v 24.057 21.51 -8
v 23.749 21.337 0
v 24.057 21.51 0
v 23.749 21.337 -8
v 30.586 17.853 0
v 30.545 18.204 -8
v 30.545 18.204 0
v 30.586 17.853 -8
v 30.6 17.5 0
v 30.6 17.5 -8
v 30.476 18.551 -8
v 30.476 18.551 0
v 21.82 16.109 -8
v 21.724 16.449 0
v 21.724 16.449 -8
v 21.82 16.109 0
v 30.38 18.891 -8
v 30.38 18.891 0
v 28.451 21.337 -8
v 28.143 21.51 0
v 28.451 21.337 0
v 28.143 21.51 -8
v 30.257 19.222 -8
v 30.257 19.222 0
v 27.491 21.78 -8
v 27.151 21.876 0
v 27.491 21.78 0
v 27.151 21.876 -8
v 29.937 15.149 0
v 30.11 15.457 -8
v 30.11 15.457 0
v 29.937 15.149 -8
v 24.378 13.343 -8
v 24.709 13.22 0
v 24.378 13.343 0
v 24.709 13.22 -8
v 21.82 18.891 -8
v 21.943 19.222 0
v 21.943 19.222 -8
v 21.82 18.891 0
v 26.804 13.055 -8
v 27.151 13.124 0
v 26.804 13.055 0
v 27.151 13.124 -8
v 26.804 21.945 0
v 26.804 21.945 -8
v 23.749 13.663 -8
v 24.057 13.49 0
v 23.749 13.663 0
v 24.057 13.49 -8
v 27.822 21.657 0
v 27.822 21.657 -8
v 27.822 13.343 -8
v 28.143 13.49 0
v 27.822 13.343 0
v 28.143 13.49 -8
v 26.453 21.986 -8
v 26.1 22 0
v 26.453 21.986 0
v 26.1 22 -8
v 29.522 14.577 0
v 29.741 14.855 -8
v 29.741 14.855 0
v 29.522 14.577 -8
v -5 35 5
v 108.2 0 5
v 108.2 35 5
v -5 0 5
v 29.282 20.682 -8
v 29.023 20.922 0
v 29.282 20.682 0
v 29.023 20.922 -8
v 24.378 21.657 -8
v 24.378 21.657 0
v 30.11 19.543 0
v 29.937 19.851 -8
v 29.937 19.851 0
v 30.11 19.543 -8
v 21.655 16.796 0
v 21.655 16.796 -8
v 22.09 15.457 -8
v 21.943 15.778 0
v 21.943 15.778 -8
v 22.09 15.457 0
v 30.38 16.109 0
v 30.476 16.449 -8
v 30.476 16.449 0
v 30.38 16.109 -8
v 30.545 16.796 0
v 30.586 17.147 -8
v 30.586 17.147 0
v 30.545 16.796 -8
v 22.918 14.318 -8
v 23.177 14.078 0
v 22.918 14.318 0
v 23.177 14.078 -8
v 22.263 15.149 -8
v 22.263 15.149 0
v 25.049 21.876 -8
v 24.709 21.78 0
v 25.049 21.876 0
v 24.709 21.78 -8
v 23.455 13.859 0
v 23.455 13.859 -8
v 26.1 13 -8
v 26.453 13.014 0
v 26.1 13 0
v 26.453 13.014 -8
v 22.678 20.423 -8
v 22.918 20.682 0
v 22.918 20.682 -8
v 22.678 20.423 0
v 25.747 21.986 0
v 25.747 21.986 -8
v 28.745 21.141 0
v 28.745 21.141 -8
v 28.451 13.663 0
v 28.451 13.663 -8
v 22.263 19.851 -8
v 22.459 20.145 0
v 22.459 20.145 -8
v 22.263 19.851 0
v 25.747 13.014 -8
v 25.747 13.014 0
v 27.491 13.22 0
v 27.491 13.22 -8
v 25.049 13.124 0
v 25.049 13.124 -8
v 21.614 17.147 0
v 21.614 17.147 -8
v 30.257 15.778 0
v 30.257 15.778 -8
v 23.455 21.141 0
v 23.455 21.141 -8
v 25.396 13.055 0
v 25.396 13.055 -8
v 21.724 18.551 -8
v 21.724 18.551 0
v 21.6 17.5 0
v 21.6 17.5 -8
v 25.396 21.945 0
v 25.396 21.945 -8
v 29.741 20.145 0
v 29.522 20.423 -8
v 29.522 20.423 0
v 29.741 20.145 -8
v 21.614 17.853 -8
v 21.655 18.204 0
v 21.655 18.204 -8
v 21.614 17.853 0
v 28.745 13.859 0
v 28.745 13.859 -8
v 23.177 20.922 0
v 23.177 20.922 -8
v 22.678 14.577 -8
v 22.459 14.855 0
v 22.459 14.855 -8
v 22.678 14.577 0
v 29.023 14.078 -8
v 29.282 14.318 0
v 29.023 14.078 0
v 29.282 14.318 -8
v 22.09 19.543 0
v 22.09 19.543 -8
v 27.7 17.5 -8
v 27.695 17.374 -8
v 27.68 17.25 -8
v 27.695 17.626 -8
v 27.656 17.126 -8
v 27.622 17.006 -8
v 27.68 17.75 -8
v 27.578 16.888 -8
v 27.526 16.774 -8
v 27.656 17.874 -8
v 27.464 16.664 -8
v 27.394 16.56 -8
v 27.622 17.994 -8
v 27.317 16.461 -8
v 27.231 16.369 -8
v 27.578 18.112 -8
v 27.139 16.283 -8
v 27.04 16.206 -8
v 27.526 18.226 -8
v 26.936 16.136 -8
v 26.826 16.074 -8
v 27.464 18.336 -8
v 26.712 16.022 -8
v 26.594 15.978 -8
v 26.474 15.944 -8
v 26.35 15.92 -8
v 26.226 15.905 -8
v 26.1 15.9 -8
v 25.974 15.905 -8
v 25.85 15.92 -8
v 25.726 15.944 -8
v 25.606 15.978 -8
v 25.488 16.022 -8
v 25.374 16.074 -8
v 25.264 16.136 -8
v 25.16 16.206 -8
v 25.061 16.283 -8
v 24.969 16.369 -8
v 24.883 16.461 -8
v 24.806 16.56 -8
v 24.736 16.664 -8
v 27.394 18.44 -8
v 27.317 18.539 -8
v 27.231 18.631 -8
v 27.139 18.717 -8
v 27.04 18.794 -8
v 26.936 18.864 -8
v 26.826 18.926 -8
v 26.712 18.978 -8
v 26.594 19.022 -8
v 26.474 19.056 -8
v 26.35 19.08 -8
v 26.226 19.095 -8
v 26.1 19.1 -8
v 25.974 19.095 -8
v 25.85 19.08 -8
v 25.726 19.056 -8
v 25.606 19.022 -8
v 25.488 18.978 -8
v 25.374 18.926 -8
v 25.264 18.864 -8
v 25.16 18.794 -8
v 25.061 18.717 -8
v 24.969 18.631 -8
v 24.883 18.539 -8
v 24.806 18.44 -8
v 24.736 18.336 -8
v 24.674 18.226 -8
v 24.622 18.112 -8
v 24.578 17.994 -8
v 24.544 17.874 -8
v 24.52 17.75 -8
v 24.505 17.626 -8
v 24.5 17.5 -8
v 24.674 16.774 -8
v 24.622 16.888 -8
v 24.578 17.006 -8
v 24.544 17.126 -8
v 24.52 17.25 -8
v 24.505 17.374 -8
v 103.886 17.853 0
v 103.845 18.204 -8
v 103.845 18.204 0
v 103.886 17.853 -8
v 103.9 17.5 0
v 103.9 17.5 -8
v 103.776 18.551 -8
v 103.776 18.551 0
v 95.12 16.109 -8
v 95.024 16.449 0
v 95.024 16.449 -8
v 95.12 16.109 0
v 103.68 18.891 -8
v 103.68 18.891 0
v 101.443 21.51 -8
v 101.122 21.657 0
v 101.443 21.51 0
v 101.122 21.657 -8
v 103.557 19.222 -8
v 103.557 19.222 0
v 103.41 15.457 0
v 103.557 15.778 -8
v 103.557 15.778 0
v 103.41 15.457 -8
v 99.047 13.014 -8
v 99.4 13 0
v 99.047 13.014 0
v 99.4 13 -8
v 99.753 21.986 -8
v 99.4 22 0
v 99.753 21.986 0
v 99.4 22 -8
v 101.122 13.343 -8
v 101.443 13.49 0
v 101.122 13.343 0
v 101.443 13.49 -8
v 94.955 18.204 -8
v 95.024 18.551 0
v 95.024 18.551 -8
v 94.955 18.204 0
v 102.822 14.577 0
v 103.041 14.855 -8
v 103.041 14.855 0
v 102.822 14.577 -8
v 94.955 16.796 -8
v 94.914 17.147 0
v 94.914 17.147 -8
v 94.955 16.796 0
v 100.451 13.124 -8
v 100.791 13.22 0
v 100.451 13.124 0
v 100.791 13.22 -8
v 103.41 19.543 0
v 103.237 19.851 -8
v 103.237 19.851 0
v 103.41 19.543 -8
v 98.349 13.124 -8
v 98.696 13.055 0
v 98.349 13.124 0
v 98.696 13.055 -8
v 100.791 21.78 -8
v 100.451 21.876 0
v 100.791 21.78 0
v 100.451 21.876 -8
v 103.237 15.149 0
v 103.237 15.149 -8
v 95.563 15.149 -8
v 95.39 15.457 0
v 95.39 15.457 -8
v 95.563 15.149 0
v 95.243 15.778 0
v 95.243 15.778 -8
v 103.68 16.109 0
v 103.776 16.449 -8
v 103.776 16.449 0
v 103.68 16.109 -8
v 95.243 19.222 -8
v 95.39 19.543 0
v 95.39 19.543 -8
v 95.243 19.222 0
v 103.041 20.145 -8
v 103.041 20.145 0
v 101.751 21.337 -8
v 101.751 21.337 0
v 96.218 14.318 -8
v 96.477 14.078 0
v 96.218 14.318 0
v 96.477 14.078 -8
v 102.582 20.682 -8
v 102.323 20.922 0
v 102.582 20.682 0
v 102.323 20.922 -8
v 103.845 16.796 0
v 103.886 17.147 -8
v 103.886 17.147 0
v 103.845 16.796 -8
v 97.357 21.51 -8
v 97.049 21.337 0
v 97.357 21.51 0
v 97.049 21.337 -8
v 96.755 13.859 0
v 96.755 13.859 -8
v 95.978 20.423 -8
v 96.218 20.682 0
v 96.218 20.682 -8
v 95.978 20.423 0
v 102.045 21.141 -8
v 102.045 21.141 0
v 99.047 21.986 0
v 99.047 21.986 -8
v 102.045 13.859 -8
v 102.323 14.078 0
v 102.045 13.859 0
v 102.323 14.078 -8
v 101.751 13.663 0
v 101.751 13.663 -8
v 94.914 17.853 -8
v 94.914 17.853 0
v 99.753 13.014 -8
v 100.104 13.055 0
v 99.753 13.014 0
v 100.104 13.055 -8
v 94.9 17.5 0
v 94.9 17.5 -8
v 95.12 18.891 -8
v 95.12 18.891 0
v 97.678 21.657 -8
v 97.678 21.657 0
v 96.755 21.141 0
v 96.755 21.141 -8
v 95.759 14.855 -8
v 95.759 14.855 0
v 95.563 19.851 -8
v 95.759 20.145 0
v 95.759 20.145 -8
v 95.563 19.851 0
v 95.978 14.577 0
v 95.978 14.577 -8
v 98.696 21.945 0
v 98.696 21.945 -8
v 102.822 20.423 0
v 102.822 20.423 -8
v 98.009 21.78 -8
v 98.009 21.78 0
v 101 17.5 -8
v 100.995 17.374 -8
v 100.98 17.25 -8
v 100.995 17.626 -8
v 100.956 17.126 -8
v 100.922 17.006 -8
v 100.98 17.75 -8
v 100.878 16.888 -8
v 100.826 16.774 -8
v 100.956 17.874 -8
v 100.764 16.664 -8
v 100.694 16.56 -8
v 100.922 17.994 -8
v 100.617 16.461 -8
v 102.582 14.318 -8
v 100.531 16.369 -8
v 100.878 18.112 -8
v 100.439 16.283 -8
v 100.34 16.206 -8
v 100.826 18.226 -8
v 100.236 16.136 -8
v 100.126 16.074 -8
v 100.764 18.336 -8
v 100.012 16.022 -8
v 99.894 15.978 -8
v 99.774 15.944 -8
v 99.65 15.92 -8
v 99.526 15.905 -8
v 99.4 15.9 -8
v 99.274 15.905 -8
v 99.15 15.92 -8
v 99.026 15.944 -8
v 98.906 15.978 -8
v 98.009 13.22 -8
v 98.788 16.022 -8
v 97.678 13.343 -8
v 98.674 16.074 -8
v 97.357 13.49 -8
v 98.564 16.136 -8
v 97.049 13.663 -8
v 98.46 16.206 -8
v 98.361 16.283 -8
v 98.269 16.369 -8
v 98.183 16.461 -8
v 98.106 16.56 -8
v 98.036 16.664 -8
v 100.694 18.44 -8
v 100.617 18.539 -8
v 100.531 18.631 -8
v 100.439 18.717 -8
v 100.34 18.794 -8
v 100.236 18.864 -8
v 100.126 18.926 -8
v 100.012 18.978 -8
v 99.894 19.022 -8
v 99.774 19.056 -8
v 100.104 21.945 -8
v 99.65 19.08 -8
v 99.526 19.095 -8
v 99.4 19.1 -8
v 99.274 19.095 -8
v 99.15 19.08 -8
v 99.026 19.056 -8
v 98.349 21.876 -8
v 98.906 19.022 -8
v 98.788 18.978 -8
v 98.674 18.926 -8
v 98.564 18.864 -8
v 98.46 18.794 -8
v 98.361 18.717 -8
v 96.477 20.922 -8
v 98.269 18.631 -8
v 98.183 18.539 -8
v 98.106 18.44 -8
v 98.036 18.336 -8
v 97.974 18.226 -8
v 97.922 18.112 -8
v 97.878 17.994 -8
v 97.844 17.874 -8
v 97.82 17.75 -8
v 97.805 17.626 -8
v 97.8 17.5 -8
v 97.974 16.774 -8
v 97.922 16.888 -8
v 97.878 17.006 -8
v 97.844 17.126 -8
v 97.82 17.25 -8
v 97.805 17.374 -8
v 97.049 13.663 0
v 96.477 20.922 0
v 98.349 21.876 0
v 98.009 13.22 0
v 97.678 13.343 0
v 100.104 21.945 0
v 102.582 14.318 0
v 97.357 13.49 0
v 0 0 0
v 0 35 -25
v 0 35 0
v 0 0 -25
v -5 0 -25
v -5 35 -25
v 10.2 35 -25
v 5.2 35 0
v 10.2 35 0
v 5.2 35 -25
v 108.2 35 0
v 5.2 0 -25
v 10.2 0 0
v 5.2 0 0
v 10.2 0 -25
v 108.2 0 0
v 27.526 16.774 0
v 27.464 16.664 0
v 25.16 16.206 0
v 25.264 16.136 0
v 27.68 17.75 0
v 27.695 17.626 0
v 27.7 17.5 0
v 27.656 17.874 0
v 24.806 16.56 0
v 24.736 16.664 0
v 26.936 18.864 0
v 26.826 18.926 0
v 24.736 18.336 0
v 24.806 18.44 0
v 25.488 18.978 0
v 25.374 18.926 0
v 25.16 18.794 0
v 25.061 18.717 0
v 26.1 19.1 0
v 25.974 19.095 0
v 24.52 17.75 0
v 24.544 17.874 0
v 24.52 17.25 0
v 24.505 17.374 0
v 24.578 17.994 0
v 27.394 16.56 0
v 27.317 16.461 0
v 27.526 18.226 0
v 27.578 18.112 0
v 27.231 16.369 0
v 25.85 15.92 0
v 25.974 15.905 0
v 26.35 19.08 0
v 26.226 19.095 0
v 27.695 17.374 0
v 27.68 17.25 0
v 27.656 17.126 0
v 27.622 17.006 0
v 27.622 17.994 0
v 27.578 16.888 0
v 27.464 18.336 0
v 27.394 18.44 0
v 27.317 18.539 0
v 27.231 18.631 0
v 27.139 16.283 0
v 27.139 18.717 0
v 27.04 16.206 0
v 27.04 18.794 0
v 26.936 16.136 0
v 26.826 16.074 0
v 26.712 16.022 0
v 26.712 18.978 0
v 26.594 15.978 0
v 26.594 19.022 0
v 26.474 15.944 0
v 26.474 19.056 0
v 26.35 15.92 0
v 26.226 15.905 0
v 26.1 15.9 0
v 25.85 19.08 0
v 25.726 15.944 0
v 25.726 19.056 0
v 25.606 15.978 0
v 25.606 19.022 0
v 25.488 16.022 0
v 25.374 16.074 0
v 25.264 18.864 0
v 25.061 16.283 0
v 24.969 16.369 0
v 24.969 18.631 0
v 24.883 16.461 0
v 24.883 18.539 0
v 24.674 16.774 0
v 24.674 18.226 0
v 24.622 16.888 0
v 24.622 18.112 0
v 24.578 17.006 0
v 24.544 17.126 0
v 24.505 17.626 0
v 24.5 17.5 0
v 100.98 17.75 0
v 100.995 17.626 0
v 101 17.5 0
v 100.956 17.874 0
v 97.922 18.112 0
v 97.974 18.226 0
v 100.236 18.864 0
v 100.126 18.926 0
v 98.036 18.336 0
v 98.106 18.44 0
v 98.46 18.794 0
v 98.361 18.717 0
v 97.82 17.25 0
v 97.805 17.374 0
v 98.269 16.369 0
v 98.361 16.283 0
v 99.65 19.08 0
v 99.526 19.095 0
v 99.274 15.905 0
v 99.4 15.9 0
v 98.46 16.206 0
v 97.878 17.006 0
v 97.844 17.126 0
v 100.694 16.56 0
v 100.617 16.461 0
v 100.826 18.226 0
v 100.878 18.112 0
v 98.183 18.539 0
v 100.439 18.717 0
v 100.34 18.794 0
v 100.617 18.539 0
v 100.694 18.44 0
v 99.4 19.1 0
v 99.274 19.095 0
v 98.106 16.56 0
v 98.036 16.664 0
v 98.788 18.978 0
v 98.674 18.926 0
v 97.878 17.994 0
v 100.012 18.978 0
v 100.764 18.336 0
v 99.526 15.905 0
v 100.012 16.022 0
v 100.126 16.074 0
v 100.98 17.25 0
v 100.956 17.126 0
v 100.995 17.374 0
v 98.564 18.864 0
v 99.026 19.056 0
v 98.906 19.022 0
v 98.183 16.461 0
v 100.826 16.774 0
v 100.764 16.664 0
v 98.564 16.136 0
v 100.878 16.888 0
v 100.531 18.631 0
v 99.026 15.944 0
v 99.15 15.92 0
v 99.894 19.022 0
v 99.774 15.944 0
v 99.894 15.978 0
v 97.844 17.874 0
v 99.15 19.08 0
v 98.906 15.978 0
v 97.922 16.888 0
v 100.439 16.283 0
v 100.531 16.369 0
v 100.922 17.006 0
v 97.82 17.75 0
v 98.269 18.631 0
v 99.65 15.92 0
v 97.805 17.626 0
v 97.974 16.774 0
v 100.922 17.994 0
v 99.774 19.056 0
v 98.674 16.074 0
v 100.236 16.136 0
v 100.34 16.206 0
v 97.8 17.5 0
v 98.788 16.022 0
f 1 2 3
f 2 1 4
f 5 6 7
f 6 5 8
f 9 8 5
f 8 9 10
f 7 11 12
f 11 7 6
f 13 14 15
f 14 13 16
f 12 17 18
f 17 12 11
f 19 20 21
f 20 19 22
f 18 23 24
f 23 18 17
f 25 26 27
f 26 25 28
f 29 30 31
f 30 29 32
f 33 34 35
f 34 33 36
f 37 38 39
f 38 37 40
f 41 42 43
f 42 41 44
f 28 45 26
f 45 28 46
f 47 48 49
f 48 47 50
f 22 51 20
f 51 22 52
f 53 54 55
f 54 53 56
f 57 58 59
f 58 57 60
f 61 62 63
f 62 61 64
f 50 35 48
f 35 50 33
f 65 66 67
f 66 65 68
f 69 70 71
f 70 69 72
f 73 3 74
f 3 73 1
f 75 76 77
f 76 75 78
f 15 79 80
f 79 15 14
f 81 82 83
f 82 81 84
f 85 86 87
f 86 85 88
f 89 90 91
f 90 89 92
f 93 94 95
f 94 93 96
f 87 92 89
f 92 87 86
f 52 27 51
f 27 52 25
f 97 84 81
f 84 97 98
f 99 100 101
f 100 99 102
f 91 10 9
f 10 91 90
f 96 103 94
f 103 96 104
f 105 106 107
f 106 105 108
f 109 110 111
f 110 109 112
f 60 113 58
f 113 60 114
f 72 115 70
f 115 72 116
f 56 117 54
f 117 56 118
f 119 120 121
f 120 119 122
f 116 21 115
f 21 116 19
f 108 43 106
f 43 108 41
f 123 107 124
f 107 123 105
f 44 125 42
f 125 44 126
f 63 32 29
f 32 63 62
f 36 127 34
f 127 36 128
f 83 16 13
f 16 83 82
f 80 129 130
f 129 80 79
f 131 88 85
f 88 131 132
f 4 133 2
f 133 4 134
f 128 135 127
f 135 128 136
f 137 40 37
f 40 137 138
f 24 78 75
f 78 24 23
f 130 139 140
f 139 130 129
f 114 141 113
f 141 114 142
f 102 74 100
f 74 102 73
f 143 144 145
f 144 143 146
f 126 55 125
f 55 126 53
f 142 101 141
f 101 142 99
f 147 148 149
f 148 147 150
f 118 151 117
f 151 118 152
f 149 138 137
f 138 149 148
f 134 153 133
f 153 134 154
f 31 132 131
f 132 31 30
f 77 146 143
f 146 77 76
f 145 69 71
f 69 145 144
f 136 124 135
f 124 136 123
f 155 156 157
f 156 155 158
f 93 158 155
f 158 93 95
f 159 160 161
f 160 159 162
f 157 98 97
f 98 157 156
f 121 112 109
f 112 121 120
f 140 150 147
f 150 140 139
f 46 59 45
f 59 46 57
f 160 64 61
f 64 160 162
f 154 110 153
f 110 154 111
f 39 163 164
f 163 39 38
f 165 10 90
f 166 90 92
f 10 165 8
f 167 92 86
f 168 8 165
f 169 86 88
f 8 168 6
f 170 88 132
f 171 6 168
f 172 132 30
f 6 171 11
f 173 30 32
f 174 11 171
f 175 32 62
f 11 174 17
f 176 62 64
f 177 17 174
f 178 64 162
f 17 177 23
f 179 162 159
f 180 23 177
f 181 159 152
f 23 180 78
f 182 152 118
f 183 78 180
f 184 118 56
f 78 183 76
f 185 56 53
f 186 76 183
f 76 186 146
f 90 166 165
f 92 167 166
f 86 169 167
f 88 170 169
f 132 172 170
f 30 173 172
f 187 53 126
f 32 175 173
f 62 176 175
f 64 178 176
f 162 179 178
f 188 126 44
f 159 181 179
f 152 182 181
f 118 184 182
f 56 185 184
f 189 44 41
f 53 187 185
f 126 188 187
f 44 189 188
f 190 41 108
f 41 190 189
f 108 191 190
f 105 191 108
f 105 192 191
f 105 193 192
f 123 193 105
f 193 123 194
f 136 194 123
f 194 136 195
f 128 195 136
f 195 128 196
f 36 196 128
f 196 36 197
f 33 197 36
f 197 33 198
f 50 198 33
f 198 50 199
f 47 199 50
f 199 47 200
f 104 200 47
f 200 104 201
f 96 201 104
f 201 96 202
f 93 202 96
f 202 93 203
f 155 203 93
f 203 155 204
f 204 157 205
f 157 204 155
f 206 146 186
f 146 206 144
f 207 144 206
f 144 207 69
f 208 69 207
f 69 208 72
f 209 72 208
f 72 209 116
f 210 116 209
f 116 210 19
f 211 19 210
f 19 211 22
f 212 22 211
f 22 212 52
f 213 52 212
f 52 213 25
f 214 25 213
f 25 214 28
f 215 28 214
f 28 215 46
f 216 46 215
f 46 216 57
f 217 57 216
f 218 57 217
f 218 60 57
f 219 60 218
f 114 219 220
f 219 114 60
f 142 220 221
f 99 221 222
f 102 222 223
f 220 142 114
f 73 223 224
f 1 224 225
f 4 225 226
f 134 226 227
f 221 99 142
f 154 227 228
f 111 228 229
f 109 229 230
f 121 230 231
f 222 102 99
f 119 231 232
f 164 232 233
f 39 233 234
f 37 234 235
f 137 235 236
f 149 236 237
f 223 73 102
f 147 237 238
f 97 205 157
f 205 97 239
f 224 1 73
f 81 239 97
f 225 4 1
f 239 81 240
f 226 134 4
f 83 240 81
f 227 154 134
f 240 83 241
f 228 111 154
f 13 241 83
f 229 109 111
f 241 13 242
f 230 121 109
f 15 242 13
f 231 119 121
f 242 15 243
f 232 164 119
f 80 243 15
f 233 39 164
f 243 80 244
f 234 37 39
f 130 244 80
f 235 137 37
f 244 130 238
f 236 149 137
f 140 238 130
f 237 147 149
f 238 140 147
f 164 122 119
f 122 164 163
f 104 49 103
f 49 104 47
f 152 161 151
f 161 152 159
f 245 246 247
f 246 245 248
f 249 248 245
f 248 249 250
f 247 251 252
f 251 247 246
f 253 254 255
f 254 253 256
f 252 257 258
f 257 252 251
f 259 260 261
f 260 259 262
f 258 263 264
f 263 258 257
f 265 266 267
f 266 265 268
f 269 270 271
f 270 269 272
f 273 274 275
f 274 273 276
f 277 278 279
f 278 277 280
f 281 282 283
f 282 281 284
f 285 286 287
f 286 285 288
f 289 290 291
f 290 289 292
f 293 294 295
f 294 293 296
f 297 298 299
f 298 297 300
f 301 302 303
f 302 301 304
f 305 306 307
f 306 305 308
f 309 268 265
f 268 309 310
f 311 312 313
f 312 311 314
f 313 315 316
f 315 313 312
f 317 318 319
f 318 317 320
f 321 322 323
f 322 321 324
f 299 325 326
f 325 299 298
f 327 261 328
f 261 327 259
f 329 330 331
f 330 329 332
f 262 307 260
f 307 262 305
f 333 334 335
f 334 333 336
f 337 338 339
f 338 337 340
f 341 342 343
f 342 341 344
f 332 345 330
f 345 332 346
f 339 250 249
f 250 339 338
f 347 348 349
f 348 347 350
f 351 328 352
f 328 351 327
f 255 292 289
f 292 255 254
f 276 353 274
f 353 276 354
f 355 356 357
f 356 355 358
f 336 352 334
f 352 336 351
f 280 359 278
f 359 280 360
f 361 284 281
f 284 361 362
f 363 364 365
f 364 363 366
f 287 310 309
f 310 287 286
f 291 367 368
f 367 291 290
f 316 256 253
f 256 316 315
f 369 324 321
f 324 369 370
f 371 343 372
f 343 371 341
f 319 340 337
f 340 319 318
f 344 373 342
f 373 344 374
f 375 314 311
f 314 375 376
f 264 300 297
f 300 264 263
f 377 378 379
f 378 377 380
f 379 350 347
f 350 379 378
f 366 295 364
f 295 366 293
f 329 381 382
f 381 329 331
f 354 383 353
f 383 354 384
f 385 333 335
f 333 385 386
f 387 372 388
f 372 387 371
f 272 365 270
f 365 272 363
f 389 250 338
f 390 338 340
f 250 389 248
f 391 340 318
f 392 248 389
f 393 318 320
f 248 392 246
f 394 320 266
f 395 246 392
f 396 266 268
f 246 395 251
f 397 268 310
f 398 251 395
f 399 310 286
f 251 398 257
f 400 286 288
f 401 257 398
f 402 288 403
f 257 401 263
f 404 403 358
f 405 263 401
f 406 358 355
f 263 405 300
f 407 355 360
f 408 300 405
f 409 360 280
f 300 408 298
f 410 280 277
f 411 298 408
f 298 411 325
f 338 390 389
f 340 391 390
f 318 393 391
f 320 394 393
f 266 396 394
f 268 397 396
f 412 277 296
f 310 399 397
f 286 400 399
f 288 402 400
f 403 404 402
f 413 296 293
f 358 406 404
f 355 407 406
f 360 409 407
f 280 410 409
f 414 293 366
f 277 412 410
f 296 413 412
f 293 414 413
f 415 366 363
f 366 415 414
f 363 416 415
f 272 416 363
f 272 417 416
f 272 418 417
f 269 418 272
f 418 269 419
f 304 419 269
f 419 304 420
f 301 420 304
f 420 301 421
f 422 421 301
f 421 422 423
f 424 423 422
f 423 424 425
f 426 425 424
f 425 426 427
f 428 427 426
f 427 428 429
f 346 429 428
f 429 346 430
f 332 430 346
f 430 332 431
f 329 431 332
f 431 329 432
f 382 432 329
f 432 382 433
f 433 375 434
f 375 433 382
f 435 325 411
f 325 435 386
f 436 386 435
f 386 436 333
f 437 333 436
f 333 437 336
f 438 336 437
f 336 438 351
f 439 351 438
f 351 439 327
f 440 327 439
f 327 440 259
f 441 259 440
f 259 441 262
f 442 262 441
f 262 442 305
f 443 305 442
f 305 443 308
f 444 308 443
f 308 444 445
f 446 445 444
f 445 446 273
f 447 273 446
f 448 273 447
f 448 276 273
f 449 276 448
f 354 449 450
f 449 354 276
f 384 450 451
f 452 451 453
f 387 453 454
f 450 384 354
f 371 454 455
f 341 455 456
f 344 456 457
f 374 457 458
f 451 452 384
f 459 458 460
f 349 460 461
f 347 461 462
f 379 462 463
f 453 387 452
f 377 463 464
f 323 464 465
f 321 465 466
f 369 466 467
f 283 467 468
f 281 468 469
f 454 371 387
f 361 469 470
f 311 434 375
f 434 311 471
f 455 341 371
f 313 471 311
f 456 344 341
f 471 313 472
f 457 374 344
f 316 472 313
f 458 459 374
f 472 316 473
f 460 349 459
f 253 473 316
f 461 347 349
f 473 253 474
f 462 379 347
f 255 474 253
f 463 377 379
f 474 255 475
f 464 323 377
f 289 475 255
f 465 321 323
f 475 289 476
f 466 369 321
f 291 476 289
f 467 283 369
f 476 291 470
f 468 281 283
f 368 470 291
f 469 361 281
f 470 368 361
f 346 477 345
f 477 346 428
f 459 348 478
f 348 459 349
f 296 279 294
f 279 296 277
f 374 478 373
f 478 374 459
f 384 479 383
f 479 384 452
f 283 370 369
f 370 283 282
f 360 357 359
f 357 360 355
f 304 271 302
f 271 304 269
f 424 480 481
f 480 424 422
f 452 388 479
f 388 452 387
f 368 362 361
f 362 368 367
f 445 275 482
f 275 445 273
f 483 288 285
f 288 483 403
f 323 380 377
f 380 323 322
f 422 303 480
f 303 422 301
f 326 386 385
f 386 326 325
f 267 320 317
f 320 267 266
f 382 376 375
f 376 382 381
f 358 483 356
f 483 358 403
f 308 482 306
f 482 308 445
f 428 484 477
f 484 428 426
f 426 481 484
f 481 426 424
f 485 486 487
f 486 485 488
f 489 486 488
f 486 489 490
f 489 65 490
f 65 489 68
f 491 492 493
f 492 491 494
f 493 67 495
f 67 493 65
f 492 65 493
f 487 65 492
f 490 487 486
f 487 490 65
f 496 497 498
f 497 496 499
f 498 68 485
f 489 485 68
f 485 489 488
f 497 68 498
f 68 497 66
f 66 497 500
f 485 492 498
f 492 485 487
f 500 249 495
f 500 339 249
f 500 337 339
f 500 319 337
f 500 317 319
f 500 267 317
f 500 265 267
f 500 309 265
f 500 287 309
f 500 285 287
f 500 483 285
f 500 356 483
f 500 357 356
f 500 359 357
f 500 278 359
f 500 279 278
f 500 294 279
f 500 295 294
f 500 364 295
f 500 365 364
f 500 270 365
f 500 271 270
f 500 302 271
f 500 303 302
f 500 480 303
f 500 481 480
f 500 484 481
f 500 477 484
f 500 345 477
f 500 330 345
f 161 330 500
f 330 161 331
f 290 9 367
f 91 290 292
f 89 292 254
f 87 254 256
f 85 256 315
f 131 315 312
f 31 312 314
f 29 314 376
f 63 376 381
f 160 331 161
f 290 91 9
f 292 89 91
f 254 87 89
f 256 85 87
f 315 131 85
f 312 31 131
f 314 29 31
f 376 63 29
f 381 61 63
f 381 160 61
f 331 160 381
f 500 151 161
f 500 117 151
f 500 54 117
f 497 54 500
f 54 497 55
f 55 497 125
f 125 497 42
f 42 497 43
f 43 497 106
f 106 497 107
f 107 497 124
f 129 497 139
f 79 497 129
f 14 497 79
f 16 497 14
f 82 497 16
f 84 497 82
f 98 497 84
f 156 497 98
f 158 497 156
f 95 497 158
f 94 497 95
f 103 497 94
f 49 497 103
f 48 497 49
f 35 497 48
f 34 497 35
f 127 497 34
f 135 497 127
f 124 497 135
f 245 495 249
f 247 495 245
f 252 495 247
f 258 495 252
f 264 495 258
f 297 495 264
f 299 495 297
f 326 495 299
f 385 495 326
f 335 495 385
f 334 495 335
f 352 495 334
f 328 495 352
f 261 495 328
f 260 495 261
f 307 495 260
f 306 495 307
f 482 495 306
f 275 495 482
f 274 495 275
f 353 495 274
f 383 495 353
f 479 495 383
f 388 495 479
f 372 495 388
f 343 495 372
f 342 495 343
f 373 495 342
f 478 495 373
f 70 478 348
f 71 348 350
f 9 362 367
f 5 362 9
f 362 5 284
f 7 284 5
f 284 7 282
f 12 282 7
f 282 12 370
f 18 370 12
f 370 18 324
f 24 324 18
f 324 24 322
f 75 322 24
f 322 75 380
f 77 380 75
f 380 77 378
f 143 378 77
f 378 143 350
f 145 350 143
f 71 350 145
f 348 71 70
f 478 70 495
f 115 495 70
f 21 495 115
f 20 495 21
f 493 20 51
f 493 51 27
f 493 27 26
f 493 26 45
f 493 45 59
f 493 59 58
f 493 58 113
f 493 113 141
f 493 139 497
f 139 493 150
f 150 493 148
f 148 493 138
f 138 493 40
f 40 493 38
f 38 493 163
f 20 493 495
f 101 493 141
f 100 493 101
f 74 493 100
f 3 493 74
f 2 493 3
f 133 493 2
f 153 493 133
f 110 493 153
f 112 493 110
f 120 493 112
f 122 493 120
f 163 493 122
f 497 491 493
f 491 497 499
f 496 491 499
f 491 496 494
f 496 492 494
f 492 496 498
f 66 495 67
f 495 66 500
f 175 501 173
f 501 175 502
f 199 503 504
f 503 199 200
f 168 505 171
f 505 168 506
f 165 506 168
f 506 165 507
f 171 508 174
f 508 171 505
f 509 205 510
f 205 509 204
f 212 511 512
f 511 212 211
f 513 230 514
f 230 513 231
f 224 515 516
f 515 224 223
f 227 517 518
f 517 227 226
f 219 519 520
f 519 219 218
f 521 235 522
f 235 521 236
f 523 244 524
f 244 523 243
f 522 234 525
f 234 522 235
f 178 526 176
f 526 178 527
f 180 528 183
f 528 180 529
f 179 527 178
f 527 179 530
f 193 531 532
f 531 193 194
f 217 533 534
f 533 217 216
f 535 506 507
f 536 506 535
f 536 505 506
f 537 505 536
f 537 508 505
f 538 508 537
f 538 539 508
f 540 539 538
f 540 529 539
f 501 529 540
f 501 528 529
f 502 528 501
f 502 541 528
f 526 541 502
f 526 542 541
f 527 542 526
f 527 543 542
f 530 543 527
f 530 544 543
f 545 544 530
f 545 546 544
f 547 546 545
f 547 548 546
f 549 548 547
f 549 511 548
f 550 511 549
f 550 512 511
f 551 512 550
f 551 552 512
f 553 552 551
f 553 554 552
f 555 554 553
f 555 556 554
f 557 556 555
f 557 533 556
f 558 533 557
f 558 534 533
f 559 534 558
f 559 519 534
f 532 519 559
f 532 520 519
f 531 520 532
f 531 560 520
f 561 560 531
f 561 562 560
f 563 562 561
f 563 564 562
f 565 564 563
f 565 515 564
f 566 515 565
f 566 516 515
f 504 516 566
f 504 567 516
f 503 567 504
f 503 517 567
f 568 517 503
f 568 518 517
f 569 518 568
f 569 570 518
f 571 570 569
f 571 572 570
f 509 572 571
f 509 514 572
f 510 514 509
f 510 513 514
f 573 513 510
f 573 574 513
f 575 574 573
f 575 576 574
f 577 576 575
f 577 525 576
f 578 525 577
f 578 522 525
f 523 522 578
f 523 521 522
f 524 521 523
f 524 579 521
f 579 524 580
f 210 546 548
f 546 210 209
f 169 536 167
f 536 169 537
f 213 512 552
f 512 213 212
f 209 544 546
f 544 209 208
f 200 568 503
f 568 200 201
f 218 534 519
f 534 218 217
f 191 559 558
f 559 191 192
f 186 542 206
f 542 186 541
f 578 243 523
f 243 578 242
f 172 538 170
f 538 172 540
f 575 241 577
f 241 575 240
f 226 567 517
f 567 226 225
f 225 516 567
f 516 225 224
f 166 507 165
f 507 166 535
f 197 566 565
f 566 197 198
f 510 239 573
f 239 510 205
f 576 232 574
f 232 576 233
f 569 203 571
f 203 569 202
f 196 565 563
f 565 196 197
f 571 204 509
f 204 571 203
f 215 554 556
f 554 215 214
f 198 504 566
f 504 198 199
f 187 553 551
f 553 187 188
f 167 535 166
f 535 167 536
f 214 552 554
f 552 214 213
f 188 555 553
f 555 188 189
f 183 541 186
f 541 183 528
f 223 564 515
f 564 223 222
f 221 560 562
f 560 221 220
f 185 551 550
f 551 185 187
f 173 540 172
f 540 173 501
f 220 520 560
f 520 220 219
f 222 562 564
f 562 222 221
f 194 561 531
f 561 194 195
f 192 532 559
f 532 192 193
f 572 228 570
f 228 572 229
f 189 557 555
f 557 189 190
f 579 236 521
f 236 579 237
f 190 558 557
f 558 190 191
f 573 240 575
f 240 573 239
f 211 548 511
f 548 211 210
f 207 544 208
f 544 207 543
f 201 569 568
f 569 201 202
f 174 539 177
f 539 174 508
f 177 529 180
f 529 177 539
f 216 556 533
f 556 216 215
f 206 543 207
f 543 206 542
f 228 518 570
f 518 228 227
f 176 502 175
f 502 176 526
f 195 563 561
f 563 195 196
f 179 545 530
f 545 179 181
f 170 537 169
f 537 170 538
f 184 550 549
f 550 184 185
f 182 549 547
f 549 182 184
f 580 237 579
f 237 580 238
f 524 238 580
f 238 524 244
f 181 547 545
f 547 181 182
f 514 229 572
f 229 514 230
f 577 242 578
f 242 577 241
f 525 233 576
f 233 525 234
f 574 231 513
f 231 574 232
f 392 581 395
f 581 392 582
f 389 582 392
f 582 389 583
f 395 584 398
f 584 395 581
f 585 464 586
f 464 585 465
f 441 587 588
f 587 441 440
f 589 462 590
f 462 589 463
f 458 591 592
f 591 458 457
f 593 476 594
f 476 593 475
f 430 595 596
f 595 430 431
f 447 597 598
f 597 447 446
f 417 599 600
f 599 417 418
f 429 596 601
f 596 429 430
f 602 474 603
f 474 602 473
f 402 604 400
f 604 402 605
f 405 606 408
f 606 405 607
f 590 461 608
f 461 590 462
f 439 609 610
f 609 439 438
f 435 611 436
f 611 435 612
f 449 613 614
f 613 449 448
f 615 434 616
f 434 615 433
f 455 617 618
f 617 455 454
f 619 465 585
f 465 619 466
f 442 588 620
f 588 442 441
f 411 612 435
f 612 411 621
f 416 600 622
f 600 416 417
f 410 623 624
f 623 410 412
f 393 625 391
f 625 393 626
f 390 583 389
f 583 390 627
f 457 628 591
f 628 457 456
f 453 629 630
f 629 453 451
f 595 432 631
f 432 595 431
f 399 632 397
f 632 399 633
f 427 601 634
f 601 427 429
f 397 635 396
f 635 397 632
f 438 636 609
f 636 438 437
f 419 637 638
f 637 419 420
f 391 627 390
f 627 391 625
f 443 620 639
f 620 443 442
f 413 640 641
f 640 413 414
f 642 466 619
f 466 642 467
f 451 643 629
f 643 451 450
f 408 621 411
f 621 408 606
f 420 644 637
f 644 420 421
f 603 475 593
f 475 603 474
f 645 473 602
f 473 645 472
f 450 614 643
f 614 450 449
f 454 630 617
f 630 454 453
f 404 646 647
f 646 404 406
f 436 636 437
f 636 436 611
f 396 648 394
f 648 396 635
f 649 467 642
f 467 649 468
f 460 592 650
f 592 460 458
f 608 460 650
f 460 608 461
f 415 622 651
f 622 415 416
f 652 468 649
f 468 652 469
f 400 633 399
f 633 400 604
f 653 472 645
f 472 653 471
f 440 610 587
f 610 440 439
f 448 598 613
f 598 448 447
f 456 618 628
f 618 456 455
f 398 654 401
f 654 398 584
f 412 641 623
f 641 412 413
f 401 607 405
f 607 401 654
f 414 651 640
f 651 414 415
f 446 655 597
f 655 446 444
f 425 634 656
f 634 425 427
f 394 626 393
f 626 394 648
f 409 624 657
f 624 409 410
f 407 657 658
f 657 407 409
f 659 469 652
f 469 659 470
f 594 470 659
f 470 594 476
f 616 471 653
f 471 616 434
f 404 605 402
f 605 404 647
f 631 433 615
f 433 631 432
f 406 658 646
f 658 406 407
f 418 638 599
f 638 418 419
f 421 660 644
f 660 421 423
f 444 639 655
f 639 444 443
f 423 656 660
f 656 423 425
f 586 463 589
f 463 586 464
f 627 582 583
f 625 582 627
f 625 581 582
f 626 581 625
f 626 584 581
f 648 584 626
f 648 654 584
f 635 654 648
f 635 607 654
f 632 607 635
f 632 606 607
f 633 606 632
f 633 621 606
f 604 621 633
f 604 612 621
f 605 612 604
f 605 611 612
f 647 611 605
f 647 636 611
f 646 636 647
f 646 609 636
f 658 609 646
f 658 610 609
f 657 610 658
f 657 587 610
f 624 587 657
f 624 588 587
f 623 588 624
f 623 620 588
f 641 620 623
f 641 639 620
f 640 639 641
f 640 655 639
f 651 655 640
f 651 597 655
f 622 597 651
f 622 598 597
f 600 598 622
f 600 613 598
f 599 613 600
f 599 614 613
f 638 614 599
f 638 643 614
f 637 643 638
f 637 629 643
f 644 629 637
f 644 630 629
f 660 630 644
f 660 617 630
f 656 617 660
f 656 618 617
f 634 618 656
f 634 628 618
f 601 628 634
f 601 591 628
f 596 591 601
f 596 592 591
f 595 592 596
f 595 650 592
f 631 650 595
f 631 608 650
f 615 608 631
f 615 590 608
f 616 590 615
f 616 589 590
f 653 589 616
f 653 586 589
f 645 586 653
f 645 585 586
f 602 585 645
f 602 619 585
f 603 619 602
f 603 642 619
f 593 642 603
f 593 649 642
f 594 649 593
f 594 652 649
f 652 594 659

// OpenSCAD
//
// A02YYUW Aquarium Sensor Bracket
// Version 5 - Corrected Glass Clamp
// Units: mm
//

$fn = 80;

// ======================================
// 1. GLASS DIMENSIONS
// ======================================

glass_thickness = 5;
glass_tolerance = 0.2;
glass_slot = glass_thickness + glass_tolerance;

// ======================================
// 2. PLATFORM
// ======================================

platform_length = 98;
platform_width = 35;
platform_thickness = 5;

// ======================================
// 3. GLASS CLAMP
// ======================================

hook_drop = 25;
hook_thickness = 5;

// Coordinate positions
outer_wall_start = -5;
outer_wall_end = 0;

inner_wall_start = glass_slot;
inner_wall_end = glass_slot + hook_thickness;

platform_start = inner_wall_end;

// ======================================
// 4. SENSOR MOUNTING
// ======================================

sensor_hole_spacing = 73.3;
sensor_screw_diameter = 3.2;

post_diameter = 9;
post_height = 8;

// Original offset plus 4mm movement
sensor_edge_clearance = 5.3;
post_offset = 4;

first_hole_x =
    platform_start
    + hook_thickness
    + sensor_edge_clearance
    + sensor_screw_diameter / 2
    + post_offset;

second_hole_x =
    first_hole_x + sensor_hole_spacing;

// ======================================
// 5. MAIN BRACKET
// ======================================

difference() {

    union() {

        // Outer vertical retaining wall
        translate([
            outer_wall_start,
            0,
            -hook_drop
        ])
        cube([
            hook_thickness,
            platform_width,
            hook_drop + platform_thickness
        ]);

        // Top bridge connecting both clamp walls
        translate([
            outer_wall_end,
            0,
            0
        ])
        cube([
            glass_slot + hook_thickness,
            platform_width,
            platform_thickness
        ]);

        // Inner vertical retaining wall
        translate([
            inner_wall_start,
            0,
            -hook_drop
        ])
        cube([
            hook_thickness,
            platform_width,
            hook_drop
        ]);

        // Long horizontal sensor platform
        translate([
            platform_start,
            0,
            0
        ])
        cube([
            platform_length,
            platform_width,
            platform_thickness
        ]);

        // Two sensor mounting posts
        for (x = [first_hole_x, second_hole_x]) {

            translate([
                x,
                platform_width / 2,
                -post_height
            ])
            cylinder(
                h = post_height + platform_thickness,
                d = post_diameter
            );
        }
    }

    // ==================================
    // BLIND M3 SCREW HOLES
    // ==================================

    for (x = [first_hole_x, second_hole_x]) {

        translate([
            x,
            platform_width / 2,
            -post_height - 0.1
        ])
        cylinder(
            h = post_height + 0.1,
            d = sensor_screw_diameter
        );
    }
}

// ======================================
// 6. DIMENSION CHECKS
// ======================================

echo("Glass slot:", glass_slot);
echo("Glass slot target: 5.2mm");

echo("Platform length:", platform_length);
echo("Platform width:", platform_width);

echo("First screw centre:", first_hole_x);
echo("Second screw centre:", second_hole_x);

echo("Screw spacing:",
     second_hole_x - first_hole_x);

echo("Blind screw depth:", post_height);
